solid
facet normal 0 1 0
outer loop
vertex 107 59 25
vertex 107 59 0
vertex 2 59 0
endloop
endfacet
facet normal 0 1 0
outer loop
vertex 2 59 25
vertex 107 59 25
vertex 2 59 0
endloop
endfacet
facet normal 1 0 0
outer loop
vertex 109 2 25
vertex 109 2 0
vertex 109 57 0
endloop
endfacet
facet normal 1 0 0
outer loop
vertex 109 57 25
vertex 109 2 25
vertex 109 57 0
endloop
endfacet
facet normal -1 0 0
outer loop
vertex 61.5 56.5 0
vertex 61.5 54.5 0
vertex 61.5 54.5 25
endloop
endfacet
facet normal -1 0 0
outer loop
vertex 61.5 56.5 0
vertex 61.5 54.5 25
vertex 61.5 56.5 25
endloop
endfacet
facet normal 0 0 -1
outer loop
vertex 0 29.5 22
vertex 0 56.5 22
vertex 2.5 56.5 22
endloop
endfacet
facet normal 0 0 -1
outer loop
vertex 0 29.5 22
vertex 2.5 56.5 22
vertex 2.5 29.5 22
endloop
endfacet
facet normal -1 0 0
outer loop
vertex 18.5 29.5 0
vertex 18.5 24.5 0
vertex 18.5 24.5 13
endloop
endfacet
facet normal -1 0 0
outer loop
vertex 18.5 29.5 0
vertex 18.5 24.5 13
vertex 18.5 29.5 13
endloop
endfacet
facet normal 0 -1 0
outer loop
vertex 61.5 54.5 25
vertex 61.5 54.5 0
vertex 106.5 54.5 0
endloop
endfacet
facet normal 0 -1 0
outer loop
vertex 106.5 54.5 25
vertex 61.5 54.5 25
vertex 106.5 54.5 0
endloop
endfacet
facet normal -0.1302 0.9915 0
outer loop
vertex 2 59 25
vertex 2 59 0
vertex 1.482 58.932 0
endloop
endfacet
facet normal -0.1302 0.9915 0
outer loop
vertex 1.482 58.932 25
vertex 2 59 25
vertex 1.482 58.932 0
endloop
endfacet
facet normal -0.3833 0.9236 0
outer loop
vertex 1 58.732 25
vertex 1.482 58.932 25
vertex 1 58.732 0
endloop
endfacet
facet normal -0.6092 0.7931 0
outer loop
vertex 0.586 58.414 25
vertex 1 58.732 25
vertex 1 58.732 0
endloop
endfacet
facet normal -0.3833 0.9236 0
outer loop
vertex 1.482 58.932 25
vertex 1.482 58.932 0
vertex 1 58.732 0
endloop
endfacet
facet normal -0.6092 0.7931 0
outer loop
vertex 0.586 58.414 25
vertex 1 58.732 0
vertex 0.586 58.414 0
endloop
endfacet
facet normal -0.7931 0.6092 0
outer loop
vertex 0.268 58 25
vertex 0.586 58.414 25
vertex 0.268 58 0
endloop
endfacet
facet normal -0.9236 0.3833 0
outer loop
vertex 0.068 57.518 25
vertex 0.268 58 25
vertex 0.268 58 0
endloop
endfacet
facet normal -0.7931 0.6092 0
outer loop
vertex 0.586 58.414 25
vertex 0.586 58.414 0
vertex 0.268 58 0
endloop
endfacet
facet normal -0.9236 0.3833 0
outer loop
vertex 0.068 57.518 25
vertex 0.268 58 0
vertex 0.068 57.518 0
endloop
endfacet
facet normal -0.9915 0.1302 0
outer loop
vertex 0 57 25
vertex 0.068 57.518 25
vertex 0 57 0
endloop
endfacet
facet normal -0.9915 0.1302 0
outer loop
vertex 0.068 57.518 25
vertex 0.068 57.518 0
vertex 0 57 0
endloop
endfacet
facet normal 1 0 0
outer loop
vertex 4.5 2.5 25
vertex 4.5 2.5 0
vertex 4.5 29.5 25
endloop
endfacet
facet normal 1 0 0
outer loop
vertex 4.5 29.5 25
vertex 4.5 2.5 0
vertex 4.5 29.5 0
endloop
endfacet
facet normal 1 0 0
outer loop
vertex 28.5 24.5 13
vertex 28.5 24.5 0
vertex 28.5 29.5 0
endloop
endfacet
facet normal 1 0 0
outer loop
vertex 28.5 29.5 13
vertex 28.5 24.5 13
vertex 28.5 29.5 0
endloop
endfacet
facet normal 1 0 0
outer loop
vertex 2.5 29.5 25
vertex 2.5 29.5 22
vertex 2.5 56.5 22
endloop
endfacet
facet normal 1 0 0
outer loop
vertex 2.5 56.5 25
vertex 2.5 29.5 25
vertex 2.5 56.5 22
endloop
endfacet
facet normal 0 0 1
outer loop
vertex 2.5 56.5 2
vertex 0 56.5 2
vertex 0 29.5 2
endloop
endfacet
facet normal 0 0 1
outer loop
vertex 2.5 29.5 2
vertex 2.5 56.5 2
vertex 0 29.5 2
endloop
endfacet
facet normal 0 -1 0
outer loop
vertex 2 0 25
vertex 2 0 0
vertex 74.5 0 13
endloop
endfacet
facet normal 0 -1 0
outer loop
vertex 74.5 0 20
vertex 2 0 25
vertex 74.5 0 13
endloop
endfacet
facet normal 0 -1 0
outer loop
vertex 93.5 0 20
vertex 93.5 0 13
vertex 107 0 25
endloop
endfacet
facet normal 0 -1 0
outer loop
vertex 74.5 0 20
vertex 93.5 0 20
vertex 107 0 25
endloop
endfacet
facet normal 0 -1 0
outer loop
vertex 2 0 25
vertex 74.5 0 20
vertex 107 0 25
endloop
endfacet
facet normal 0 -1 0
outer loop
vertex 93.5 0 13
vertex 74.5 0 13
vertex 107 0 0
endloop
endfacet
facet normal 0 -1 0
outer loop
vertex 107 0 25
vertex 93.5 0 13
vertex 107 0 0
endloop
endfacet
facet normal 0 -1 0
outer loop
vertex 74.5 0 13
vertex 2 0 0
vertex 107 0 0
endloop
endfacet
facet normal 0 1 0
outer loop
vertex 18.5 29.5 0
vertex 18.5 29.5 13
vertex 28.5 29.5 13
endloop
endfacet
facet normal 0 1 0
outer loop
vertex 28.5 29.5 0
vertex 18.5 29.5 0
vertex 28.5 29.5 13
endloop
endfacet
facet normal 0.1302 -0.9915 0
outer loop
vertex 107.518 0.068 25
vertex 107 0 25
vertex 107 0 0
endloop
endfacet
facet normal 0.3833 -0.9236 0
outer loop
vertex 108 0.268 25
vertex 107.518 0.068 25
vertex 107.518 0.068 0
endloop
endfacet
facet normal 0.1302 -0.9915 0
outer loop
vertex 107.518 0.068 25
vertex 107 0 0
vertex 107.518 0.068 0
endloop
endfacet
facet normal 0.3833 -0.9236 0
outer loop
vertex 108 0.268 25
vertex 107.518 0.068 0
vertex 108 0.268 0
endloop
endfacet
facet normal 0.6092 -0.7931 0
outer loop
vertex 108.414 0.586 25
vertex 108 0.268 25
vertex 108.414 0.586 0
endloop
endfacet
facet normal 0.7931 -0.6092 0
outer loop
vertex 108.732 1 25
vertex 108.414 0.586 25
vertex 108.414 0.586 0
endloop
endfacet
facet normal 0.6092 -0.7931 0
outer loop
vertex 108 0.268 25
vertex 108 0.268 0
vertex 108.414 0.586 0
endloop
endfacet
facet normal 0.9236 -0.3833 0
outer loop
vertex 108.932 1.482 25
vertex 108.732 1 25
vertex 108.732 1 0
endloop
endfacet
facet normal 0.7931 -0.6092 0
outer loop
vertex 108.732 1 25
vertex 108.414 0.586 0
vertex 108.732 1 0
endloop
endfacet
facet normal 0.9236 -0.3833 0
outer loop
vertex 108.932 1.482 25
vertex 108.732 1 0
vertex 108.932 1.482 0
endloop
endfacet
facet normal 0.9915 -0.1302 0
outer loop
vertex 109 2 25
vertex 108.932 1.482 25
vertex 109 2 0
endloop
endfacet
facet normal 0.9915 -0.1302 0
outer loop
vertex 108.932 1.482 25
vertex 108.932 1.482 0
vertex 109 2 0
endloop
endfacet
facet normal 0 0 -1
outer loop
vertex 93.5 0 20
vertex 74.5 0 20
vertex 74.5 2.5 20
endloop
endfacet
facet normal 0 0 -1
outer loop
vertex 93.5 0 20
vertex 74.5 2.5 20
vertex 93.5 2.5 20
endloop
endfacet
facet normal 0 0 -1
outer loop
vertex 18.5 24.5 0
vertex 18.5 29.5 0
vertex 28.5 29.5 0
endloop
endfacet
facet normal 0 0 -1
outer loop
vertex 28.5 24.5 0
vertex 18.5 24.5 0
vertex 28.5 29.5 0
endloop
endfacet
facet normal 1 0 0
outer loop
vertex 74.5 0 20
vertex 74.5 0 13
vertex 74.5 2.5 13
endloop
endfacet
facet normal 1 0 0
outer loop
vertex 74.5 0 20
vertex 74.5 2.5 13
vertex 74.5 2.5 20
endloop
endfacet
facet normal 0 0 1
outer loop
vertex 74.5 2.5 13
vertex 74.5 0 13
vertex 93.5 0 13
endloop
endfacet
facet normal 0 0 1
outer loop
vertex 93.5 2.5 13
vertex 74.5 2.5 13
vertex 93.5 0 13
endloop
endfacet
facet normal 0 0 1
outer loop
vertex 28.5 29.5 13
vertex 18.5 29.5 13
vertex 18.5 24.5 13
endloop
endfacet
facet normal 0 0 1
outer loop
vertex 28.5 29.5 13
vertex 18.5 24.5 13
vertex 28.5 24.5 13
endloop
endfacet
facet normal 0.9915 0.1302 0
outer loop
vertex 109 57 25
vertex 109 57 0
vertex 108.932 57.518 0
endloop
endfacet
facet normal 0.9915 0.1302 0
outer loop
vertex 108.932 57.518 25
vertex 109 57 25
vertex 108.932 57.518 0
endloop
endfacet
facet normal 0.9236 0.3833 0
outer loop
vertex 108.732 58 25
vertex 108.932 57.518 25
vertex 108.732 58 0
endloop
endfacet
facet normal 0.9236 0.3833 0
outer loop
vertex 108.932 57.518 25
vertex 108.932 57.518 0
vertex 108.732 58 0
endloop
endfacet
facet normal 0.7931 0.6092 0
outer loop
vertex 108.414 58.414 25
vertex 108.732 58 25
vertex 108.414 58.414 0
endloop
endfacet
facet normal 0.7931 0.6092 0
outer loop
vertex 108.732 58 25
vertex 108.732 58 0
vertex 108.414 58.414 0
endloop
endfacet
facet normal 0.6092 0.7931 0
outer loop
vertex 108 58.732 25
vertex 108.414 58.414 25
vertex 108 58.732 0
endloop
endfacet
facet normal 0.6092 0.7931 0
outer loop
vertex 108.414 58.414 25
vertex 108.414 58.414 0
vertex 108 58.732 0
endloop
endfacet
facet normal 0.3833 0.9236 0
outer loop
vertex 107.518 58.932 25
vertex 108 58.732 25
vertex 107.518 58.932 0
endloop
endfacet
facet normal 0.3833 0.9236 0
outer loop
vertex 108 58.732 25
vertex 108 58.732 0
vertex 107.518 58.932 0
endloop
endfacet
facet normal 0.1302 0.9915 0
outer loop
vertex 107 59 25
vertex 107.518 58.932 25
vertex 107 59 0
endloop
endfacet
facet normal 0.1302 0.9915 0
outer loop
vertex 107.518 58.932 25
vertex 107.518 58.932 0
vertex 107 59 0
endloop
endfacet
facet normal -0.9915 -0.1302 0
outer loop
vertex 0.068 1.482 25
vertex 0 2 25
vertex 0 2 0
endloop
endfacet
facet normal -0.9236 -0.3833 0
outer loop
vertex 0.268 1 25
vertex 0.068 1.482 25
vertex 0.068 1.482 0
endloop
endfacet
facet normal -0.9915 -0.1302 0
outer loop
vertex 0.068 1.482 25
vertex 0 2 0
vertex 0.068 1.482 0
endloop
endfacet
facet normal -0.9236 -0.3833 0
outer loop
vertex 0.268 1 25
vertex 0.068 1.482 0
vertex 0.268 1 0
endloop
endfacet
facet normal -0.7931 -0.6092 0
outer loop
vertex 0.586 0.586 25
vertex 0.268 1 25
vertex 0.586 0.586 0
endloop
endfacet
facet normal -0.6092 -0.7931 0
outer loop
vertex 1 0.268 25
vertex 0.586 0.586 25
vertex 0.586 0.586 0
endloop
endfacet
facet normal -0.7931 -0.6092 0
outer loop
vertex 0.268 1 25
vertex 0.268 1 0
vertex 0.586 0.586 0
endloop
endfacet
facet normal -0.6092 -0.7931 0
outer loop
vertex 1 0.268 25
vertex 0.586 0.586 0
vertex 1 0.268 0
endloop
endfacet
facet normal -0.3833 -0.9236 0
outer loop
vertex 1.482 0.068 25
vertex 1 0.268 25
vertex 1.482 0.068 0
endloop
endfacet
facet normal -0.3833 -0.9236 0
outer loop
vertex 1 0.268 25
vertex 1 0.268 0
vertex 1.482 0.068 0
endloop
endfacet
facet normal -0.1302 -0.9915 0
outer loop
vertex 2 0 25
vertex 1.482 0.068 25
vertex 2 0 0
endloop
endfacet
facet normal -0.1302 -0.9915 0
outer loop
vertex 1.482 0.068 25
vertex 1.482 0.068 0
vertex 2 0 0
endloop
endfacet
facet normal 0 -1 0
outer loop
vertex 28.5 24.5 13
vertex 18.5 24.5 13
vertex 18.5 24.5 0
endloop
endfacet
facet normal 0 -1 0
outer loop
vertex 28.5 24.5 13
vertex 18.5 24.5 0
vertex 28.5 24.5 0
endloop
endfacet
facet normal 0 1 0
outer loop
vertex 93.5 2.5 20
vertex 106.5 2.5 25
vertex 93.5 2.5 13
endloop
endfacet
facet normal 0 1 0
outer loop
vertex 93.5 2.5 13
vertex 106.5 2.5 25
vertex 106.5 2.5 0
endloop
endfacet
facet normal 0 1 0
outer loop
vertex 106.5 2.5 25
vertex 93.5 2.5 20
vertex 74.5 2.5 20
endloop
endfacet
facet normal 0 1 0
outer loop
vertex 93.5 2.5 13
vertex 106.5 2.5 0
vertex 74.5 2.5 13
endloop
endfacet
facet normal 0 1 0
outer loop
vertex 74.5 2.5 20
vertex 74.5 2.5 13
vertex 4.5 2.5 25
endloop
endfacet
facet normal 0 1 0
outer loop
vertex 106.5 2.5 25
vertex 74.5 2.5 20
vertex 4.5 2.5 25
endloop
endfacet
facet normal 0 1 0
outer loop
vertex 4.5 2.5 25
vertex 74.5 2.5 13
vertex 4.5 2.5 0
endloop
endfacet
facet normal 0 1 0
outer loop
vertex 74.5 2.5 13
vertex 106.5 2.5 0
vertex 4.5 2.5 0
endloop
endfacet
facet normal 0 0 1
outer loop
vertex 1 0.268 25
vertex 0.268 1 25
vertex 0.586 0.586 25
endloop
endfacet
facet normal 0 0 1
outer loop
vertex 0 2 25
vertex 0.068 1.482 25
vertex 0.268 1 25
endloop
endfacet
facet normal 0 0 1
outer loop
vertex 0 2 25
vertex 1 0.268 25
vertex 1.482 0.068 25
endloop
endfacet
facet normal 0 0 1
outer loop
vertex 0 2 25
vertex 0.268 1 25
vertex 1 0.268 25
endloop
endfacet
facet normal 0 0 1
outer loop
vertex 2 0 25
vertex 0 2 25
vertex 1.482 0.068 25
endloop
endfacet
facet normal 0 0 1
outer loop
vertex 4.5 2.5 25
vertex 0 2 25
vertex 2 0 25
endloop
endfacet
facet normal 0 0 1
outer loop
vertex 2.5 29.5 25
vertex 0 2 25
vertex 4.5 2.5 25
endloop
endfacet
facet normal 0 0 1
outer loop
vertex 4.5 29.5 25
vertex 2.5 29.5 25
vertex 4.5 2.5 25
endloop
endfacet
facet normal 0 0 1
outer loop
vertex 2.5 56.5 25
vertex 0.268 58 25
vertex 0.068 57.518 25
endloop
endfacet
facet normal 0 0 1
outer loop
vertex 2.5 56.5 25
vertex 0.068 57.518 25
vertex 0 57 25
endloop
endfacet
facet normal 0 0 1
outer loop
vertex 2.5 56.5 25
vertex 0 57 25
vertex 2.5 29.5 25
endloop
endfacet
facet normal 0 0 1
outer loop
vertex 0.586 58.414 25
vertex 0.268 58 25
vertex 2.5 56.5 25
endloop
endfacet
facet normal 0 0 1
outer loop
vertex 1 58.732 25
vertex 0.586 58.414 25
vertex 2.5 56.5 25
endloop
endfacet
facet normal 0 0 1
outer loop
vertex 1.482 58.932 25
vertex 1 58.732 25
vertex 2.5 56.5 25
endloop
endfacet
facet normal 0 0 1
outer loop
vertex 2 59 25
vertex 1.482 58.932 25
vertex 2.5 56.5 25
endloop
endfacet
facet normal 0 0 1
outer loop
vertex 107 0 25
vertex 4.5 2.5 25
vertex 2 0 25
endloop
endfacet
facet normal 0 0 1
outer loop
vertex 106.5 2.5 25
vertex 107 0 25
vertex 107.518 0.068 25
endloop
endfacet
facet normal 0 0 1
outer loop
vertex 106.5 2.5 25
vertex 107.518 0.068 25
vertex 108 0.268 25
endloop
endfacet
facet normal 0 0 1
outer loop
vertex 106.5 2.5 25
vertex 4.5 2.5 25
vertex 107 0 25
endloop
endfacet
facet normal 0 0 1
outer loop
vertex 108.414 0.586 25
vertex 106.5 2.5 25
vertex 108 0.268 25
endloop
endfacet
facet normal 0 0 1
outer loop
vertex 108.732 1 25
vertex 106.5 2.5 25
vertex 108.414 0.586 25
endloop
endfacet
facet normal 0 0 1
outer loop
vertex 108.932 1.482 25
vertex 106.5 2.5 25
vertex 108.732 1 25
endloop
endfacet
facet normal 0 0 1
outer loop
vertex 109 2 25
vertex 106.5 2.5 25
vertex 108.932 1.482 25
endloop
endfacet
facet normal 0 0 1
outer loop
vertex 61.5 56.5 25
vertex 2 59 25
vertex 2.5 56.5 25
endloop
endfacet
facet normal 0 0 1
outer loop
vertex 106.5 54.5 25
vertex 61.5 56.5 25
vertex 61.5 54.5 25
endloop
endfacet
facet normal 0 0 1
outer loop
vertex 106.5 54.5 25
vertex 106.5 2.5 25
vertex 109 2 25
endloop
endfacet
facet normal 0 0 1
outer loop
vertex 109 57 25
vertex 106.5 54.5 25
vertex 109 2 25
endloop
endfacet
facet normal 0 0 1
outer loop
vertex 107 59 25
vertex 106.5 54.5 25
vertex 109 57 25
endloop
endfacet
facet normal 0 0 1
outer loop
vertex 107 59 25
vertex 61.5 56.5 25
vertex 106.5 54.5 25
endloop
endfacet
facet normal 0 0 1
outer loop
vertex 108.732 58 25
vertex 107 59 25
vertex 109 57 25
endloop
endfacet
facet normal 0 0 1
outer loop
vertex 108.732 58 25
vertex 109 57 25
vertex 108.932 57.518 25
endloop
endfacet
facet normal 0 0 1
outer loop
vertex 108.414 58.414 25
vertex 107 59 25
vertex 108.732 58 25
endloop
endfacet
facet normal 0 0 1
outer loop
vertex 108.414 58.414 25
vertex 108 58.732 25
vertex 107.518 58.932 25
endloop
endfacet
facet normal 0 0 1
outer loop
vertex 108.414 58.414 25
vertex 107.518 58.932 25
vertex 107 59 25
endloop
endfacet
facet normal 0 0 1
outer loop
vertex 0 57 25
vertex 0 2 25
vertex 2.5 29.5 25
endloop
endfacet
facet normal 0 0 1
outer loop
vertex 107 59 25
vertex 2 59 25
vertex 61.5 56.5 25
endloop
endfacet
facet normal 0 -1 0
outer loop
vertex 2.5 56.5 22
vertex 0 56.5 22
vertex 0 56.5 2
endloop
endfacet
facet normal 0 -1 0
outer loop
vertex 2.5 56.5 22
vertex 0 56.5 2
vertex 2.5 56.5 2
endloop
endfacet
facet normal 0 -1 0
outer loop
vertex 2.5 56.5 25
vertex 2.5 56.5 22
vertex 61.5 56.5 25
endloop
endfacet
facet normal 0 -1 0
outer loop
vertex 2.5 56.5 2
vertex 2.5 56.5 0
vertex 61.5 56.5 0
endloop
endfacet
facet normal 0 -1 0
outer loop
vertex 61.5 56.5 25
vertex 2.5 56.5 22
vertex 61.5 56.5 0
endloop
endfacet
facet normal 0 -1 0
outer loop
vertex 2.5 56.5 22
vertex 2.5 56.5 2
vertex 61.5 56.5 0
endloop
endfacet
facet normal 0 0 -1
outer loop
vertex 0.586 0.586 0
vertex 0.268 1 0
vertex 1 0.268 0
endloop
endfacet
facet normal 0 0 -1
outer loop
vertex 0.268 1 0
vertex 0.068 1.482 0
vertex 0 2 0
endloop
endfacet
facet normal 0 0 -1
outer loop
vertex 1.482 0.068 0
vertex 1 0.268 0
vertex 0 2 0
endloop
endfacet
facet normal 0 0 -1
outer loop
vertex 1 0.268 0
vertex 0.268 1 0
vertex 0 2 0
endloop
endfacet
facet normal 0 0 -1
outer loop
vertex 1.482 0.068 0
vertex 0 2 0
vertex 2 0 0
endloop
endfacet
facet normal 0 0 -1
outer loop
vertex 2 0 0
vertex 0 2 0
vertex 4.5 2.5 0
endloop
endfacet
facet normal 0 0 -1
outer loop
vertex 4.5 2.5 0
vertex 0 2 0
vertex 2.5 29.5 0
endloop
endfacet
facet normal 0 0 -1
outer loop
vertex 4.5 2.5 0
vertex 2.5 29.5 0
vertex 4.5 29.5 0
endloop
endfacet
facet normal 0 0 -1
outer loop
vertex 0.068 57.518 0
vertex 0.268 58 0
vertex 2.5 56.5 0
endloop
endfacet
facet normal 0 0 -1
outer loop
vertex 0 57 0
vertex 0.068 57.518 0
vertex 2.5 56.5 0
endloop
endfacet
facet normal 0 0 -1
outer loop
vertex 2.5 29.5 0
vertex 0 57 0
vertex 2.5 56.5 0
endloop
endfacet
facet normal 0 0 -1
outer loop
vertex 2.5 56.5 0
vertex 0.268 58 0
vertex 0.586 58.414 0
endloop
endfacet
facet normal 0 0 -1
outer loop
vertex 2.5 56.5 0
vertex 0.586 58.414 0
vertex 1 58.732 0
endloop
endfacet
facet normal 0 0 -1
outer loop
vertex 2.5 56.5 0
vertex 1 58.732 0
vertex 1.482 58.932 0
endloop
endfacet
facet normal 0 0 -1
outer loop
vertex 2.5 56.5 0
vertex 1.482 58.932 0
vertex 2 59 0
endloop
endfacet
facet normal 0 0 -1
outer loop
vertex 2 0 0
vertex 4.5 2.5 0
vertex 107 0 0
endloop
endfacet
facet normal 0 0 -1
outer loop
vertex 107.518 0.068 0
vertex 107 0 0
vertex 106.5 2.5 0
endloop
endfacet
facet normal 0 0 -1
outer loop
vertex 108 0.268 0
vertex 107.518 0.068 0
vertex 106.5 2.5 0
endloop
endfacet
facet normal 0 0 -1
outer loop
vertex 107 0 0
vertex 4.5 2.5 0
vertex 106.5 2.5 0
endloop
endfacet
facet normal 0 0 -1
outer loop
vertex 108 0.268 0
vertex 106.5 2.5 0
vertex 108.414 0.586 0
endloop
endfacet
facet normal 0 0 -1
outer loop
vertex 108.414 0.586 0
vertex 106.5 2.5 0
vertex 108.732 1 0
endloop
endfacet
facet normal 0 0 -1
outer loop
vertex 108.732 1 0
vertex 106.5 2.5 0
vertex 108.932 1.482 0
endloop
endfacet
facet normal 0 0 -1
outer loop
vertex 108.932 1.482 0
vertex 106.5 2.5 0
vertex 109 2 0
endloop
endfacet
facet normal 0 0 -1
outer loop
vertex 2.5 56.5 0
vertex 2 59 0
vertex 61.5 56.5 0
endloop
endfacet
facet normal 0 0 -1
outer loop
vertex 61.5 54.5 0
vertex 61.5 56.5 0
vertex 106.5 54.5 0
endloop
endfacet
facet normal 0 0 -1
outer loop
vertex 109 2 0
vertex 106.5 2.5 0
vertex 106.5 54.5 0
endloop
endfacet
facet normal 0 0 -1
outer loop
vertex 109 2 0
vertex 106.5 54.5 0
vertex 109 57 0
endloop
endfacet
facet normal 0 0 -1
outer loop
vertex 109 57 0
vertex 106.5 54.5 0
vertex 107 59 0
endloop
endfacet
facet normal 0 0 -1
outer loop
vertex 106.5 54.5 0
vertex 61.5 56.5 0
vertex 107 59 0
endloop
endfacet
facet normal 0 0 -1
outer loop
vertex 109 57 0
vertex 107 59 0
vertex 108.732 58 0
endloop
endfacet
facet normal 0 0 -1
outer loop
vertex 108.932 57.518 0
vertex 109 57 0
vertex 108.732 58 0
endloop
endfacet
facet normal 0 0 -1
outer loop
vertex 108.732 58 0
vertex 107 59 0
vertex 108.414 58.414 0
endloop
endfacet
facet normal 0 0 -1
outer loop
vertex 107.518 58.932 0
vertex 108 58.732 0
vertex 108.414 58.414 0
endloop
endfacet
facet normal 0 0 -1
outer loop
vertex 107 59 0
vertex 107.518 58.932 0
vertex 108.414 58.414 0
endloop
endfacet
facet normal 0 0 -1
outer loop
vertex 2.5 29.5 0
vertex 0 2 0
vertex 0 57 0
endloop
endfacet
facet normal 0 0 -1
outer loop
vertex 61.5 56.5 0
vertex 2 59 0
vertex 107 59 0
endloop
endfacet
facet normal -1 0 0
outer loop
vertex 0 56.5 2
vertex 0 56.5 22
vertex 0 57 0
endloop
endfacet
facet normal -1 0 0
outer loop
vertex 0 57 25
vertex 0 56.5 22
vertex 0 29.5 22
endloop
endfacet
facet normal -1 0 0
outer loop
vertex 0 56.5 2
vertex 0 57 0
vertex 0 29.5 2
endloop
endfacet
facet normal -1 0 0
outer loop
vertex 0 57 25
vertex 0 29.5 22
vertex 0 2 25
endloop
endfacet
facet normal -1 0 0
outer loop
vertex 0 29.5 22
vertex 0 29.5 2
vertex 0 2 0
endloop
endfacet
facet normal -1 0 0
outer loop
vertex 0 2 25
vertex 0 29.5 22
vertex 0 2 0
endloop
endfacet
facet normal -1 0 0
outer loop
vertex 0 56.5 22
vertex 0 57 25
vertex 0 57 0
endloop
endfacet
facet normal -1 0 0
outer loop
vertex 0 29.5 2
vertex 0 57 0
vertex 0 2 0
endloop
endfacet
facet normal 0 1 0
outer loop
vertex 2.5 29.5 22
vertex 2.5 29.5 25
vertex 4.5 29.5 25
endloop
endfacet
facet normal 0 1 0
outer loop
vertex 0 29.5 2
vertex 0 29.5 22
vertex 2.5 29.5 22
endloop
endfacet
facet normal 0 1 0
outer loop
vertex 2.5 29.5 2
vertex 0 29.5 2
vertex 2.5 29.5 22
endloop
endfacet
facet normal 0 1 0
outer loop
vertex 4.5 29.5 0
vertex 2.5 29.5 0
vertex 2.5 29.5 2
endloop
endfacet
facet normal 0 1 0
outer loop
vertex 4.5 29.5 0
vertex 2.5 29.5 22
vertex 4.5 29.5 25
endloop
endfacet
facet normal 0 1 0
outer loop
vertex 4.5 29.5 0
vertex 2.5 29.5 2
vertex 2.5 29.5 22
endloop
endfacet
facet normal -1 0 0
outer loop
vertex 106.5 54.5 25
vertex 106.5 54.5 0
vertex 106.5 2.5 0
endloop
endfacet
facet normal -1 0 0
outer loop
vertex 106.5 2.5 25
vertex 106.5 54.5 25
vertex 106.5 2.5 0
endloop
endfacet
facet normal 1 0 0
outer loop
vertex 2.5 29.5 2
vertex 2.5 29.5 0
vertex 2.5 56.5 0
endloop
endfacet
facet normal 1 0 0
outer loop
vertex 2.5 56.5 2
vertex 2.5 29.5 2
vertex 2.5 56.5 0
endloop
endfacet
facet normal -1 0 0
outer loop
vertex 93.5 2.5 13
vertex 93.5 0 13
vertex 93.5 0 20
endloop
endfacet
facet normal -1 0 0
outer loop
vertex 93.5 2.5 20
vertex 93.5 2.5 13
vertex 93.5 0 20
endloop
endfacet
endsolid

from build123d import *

# Parameters (mm, degrees)
F1_DEPTH  = 25
F2_W      = 19
F2_H      = 7
F3_DEPTH  = 2.5
F0_W      = 45
F0_H      = 2
F5_DEPTH  = 25
F0_W_2    = 2
F0_H_2    = 27
F6_DEPTH  = 25
F4_W      = 10
F4_H      = 5
F7_DEPTH  = 13
F8_W      = 27
F8_H      = 20
F9_DEPTH  = 2.5
F10_DEPTH = 13


with BuildPart() as f1:
    # F0 (on Top) → F1 (new body)
    with BuildSketch(Plane.XY):
        with BuildLine():
            ThreePointArc((0, 2), (0.5857864376, 0.5857864376), (2, 0))
            Line((2, 0), (107, 0))
            ThreePointArc((107, 0), (108.4142135624, 0.5857864376), (109, 2))
            Line((109, 2), (109, 57))
            ThreePointArc((109, 57), (108.4142135624, 58.4142135624), (107, 59))
            Line((107, 59), (2, 59))
            ThreePointArc((2, 59), (0.5857864376, 58.4142135624), (0, 57))
            Line((0, 57), (0, 2))
        make_face()
        Polygon((2.5, 29.5), (2.5, 56.5), (61.5, 56.5), (106.5, 56.5), (106.5, 54.5), (106.5, 2.5), (4.5, 2.5), (2.5, 2.5), align=None, mode=Mode.SUBTRACT)
    extrude(amount=F1_DEPTH)

    # F2 (on face) → F3 (cut)
    with BuildSketch(Plane.XZ):
        with Locations((84, 16.5)):
            Rectangle(F2_W, F2_H)
    extrude(amount=-F3_DEPTH, mode=Mode.SUBTRACT)

    # F0 (on Top) → F5 (join)
    with BuildSketch(Plane.XY):
        with Locations((84, 55.5)):
            Rectangle(F0_W, F0_H)
    extrude(amount=F5_DEPTH)

    # F0 (on Top) → F6 (join)
    with BuildSketch(Plane.XY):
        with Locations((3.5, 16)):
            Rectangle(F0_W_2, F0_H_2)
    extrude(amount=F6_DEPTH)

    # F8 (on face) → F9 (cut)
    with BuildSketch(Plane(origin=(0, 0, 0), x_dir=(0, -1, 0), z_dir=(-1, 0, 0))):
        with Locations((-43, 12)):
            Rectangle(F8_W, F8_H)
    extrude(amount=-F9_DEPTH, mode=Mode.SUBTRACT)


with BuildPart() as f7:
    # F4 (on Top) → F7 (new body)
    with BuildSketch(Plane.XY):
        with Locations((23.5, 27)):
            Rectangle(F4_W, F4_H)
    extrude(amount=F7_DEPTH)

    # F4 (on Top) → F10 (join)
    with BuildSketch(Plane.XY):
        with Locations((23.5, 27)):
            Rectangle(F4_W, F4_H)
    extrude(amount=F10_DEPTH)


solid = Compound([f1.part, f7.part])
